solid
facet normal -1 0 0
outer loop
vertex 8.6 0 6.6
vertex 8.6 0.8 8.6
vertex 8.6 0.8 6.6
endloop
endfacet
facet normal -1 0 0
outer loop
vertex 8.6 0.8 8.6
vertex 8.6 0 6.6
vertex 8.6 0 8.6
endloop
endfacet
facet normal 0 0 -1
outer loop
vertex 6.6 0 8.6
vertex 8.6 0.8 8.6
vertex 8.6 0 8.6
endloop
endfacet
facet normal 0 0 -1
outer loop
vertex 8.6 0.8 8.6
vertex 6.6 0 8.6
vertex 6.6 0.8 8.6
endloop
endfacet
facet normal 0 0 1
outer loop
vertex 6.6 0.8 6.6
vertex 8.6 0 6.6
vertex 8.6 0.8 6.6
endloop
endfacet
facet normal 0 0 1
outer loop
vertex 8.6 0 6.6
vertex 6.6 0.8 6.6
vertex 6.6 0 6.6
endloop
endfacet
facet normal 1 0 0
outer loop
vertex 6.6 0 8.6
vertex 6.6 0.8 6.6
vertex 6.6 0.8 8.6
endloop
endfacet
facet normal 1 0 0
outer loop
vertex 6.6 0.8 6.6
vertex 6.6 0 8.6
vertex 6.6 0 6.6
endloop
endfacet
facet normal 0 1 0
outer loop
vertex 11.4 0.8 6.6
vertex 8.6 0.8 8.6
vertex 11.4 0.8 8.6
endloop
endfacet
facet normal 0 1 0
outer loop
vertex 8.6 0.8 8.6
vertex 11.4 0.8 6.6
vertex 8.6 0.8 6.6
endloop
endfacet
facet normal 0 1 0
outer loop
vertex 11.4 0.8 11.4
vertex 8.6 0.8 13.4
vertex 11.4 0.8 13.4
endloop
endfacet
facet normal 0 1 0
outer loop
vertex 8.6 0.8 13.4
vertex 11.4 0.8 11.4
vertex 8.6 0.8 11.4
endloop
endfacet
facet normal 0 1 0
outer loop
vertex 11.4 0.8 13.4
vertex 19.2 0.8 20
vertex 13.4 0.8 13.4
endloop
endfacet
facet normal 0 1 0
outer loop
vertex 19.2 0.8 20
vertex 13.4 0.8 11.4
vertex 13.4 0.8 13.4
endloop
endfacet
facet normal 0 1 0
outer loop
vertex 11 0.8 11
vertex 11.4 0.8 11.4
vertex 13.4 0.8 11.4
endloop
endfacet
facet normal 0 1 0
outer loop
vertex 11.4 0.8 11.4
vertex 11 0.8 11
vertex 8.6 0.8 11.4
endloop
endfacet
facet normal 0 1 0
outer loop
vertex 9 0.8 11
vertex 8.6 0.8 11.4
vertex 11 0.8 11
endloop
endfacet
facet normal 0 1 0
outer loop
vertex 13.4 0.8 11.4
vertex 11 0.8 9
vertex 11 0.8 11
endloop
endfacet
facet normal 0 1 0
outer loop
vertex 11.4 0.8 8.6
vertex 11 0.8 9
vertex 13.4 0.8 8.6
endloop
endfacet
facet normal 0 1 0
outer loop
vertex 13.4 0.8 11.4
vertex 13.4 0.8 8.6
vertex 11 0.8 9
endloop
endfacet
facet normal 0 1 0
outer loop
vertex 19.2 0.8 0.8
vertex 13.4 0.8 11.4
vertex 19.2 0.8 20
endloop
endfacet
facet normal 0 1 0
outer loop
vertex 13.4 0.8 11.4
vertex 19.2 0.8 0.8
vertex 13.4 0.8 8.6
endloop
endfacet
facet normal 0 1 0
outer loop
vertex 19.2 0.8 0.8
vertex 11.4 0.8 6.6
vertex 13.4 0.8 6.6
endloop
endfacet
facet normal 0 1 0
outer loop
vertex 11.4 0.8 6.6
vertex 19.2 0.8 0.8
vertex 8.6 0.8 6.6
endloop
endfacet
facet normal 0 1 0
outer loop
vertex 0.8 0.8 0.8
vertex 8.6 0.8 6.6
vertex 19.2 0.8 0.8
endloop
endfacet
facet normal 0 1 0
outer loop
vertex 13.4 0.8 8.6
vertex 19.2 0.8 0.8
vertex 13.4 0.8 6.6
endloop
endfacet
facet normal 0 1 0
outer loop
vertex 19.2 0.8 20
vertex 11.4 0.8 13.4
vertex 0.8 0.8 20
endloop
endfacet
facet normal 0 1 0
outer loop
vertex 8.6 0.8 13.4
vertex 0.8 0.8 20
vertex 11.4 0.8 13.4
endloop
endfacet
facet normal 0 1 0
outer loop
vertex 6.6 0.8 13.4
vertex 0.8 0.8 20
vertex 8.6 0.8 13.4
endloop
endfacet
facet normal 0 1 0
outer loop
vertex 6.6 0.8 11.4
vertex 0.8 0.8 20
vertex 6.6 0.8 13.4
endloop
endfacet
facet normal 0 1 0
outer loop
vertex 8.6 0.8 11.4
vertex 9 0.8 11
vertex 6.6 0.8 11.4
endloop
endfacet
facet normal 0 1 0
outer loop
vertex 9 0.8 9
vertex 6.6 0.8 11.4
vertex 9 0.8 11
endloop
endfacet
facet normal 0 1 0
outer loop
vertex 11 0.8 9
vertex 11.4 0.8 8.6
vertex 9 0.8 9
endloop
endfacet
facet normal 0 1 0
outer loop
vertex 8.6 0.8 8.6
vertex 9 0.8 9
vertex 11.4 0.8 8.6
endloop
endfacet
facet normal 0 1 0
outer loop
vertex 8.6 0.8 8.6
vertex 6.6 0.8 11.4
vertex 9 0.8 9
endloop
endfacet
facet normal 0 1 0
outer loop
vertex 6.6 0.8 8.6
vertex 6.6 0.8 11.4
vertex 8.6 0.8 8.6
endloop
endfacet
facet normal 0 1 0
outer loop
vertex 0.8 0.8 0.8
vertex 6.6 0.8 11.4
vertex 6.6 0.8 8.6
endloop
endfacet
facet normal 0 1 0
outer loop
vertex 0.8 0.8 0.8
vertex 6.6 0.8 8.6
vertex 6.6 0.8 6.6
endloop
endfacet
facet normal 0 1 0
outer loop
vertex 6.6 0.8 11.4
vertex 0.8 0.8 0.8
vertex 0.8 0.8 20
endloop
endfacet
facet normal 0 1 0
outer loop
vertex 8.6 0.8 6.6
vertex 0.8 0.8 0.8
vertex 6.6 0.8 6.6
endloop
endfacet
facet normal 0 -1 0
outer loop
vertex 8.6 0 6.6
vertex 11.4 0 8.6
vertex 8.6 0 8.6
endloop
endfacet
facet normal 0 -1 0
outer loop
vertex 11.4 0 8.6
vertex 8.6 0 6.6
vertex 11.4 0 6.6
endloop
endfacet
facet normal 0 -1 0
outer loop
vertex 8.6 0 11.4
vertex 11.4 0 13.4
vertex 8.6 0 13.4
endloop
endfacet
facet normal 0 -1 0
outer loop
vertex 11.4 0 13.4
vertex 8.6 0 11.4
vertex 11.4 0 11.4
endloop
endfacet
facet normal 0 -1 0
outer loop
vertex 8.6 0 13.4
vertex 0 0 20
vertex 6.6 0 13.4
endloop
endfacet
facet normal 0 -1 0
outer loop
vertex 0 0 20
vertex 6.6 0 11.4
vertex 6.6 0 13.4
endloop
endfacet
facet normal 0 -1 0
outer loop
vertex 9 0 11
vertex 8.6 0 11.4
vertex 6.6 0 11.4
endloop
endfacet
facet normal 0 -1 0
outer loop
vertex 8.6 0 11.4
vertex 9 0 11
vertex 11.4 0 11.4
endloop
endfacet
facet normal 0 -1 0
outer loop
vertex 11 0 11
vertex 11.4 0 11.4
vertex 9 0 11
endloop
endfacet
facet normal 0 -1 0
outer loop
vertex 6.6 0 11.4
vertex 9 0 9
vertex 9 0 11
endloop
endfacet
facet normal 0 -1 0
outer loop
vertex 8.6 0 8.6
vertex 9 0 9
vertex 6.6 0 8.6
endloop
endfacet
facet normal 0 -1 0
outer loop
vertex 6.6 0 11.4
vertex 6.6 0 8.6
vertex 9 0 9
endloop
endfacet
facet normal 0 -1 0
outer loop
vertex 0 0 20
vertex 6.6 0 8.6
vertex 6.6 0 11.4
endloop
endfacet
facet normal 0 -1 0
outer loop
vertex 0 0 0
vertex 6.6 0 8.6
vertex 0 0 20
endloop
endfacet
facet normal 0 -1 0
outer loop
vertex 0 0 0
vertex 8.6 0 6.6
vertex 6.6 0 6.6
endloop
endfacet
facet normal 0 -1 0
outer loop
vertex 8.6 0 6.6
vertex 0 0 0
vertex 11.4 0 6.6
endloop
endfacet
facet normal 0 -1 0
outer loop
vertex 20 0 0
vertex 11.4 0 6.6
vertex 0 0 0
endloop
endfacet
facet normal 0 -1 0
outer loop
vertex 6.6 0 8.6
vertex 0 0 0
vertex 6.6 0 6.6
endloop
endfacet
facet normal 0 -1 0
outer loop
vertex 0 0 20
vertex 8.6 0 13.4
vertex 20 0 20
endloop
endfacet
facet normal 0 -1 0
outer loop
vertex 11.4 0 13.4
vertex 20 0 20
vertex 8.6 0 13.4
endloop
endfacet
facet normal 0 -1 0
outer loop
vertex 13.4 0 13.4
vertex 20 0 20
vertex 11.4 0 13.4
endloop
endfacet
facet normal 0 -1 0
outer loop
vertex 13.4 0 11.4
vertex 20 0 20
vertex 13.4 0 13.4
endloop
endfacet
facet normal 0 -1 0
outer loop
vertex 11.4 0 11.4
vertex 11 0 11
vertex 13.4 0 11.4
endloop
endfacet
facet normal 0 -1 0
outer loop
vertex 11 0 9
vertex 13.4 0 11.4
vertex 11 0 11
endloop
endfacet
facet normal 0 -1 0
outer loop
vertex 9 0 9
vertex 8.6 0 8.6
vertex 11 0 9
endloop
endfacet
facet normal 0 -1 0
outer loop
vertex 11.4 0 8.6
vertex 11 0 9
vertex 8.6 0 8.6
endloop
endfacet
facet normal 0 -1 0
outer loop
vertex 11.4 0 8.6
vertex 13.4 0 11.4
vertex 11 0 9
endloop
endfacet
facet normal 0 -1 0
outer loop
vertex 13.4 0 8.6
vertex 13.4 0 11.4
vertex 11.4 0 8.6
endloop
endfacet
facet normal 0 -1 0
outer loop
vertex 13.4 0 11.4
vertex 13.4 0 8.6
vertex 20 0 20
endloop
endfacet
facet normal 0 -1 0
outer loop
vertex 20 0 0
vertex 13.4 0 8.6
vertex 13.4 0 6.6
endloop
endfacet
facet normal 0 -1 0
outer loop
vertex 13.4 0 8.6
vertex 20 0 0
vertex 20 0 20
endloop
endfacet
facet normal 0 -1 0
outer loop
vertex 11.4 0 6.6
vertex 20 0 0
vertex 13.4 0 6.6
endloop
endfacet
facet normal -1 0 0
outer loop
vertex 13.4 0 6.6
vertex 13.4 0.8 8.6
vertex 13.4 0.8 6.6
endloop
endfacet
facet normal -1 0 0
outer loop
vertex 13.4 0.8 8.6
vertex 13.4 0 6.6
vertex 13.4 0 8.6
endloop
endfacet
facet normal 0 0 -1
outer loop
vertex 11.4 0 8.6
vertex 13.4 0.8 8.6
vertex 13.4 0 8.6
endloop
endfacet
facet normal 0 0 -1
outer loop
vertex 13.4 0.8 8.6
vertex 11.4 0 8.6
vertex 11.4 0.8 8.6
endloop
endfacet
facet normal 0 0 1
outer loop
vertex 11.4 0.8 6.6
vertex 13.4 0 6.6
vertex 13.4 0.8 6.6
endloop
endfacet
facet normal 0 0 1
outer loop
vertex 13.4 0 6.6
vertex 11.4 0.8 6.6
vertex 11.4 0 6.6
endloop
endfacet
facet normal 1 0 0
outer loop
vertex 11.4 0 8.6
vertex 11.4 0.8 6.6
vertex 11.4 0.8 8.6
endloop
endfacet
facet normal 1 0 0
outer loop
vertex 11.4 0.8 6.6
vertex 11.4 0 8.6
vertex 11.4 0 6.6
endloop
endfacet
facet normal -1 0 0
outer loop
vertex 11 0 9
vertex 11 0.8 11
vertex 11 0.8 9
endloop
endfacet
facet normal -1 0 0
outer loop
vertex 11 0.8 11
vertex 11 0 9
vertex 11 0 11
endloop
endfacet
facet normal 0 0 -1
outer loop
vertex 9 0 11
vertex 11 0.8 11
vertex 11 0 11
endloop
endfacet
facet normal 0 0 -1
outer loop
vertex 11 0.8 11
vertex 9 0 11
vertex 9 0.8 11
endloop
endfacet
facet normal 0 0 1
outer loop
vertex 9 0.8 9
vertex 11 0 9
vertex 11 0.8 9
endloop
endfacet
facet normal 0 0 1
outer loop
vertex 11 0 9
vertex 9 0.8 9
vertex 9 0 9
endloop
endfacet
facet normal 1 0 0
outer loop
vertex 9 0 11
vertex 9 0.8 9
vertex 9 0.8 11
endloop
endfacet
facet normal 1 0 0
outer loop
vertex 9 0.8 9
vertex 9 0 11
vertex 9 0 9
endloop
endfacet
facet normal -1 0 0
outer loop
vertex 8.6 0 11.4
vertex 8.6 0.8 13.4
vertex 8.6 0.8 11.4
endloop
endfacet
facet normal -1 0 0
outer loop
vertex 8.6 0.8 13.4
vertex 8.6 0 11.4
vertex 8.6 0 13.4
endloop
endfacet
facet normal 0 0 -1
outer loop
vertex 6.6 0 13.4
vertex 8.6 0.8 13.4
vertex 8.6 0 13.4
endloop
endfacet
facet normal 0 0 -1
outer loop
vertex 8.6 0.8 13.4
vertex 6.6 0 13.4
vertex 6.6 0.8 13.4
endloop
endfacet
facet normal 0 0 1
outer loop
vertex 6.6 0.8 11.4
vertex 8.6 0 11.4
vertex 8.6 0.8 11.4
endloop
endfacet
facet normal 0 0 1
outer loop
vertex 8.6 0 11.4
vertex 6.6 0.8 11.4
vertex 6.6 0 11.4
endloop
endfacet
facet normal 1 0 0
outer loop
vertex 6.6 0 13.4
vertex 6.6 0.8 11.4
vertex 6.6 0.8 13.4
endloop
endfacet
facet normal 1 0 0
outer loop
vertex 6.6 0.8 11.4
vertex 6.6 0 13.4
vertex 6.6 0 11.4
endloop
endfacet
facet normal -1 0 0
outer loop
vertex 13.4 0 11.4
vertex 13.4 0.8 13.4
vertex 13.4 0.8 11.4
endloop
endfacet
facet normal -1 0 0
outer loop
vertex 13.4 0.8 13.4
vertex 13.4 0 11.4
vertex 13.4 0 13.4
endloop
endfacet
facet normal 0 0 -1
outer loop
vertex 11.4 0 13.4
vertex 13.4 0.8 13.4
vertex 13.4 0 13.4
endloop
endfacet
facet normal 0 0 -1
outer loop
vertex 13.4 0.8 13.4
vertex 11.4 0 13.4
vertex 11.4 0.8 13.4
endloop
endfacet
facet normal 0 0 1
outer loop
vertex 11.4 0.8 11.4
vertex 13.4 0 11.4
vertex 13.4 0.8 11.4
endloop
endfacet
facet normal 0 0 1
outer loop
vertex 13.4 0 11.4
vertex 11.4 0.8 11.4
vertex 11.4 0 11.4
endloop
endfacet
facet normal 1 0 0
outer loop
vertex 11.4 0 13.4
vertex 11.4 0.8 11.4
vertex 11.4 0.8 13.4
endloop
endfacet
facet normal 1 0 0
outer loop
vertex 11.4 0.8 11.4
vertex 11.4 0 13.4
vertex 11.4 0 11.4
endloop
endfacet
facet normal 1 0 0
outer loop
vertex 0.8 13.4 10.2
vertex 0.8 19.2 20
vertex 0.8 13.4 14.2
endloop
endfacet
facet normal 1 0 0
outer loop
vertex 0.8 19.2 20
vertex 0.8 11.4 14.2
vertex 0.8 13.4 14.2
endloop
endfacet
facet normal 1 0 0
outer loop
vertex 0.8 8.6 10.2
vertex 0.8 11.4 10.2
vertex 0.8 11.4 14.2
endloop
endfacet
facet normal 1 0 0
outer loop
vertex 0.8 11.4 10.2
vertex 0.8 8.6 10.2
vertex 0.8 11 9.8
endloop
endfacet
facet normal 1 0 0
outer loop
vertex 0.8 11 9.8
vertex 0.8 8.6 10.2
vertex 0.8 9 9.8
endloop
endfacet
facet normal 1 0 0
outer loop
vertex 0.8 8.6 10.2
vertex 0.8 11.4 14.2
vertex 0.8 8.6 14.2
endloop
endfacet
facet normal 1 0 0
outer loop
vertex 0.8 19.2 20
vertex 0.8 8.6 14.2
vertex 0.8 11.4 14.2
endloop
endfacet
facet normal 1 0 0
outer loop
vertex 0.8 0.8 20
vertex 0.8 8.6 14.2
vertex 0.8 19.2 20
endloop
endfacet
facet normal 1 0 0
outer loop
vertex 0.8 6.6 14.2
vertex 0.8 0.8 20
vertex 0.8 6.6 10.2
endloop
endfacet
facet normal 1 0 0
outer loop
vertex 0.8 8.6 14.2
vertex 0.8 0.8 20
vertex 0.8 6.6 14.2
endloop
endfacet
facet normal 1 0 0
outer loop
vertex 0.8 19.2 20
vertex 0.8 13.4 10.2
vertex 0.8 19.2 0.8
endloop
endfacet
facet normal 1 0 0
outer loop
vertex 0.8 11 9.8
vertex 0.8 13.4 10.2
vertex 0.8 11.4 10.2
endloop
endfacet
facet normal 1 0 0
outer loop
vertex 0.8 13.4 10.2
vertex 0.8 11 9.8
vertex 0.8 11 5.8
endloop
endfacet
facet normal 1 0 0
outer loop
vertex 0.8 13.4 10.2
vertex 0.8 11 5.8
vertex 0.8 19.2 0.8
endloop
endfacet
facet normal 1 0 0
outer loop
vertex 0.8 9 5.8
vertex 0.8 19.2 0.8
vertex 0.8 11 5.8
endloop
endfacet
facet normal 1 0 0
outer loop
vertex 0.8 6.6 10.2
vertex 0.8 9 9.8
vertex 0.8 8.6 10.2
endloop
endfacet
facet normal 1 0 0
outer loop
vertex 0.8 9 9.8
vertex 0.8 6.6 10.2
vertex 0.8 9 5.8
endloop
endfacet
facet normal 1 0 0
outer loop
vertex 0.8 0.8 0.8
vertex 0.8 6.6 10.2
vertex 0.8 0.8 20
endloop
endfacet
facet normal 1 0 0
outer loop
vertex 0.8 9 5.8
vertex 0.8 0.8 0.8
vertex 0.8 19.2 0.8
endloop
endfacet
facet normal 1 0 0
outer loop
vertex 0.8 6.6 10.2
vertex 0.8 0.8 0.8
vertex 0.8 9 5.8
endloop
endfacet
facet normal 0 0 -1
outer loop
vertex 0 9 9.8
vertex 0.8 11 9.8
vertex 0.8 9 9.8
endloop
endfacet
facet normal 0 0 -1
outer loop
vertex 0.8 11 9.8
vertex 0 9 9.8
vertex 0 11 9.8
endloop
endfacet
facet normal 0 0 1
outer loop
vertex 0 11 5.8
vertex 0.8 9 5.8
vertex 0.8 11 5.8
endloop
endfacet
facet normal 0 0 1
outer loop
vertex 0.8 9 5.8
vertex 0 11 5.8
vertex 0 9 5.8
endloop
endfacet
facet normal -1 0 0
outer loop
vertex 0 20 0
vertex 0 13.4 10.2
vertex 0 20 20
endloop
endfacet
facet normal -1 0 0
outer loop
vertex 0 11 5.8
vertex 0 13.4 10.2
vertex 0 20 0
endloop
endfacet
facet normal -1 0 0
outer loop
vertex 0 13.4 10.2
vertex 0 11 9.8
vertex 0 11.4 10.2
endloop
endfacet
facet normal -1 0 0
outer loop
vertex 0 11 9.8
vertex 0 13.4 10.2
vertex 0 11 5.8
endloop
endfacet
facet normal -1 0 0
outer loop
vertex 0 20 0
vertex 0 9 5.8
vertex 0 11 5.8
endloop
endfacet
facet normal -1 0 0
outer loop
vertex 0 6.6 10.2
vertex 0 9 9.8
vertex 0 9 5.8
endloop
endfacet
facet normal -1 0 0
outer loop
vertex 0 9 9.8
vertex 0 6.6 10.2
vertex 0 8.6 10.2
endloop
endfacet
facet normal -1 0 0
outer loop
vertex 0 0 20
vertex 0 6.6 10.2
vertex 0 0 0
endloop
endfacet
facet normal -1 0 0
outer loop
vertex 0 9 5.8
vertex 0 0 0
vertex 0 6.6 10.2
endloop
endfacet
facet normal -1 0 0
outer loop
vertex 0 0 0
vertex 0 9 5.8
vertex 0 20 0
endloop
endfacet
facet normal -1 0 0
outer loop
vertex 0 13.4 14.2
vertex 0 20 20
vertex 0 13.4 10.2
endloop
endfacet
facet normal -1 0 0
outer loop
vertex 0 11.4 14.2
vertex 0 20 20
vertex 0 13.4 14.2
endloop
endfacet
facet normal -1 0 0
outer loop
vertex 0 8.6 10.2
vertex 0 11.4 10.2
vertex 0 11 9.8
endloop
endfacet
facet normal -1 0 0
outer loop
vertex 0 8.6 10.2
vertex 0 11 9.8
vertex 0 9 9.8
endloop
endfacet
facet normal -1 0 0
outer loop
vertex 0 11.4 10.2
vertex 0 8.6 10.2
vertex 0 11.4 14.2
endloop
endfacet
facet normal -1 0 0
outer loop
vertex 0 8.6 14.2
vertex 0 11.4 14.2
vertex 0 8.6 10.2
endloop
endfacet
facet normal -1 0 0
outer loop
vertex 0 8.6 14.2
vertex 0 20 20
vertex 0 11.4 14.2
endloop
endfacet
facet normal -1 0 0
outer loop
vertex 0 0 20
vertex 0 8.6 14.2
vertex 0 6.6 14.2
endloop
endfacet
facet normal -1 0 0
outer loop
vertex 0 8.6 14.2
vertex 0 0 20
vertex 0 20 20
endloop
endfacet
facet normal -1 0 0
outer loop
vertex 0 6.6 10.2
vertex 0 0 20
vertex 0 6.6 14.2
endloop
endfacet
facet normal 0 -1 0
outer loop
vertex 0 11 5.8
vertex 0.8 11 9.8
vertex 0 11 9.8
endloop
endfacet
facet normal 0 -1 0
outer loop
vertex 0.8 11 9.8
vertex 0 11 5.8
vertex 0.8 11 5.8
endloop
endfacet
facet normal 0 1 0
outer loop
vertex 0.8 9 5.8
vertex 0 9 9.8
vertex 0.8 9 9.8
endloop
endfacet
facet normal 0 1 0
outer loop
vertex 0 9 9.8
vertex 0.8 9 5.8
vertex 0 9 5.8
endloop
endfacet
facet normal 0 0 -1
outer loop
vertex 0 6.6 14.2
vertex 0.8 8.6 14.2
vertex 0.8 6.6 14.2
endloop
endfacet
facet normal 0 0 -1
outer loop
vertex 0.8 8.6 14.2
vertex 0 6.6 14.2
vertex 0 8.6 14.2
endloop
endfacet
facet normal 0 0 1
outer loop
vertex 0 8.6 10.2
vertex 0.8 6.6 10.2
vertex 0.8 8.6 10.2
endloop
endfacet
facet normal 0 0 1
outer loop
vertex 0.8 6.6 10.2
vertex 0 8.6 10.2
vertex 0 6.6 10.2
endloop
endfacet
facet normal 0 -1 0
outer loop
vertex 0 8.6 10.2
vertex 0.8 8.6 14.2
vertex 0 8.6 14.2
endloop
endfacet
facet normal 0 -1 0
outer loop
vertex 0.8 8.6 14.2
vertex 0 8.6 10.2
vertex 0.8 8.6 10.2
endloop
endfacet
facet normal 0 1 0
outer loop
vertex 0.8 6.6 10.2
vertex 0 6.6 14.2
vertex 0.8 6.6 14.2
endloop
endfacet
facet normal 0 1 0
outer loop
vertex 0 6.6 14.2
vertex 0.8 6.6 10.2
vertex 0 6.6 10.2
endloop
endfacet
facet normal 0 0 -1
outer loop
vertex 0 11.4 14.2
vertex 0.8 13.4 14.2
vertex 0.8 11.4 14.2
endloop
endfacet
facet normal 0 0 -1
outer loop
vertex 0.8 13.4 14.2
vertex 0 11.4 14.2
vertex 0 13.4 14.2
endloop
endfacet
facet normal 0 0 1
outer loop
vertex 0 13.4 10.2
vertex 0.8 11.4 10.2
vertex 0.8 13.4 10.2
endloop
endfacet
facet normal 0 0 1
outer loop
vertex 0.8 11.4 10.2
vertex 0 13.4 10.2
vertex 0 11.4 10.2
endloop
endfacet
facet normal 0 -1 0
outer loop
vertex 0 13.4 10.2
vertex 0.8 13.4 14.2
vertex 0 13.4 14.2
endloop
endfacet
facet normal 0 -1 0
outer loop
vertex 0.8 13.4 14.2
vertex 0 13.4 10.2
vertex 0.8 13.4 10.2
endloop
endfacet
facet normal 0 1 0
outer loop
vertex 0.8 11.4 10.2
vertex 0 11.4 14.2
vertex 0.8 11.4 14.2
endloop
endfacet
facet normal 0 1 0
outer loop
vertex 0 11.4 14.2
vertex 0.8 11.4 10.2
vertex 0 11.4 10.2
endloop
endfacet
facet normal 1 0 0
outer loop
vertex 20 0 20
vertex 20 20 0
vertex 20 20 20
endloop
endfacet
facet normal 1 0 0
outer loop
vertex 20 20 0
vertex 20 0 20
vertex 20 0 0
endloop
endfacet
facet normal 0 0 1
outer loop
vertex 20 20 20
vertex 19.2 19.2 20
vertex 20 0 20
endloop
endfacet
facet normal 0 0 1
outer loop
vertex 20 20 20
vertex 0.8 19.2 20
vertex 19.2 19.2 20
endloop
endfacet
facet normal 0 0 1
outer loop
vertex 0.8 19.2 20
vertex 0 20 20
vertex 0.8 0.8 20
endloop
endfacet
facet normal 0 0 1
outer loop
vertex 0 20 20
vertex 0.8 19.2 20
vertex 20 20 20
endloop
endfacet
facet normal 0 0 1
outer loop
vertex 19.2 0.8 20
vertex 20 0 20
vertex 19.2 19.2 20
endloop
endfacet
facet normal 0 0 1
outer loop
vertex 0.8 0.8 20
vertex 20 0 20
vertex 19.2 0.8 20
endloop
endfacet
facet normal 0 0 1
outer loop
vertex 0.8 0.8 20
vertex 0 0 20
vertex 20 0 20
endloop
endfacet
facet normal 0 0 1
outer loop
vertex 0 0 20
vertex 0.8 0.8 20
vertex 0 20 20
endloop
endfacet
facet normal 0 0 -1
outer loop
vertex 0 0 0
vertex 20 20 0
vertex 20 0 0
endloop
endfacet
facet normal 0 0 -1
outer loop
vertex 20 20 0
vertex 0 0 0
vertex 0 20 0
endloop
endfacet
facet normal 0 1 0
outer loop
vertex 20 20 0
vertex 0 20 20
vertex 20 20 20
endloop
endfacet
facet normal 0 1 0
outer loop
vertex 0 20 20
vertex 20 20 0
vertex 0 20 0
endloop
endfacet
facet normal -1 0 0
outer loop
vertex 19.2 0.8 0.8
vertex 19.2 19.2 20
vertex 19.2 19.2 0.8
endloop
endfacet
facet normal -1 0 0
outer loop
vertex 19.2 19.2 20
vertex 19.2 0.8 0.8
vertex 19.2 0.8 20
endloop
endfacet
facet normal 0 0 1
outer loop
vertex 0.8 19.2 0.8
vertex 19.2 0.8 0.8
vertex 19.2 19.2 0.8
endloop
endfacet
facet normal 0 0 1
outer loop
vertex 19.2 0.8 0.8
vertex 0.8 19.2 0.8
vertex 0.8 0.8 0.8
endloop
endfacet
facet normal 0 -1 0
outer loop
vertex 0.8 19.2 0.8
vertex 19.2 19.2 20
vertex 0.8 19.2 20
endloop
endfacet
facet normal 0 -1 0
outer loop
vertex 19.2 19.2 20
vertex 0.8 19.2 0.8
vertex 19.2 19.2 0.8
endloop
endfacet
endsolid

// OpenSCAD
cube_dims = 20;
thk = 0.8;
inner_cube_dims = cube_dims - thk*2;

marker_x_h = 6.6;
marker_x_l = 6.6;
marker_y_h = 10-4.2;
marker_y_l = 10-1;
marker_spacing = 0.4;

marker_square_dim = 2;
marker_square_length = thk;

difference()
{
cube([cube_dims,cube_dims,cube_dims]);
translate([thk,thk,thk])
    cube([inner_cube_dims,inner_cube_dims,cube_dims]);
    
    // x marker
    translate([marker_x_l,0,marker_x_h])
    {
        cube([marker_square_dim,marker_square_length,marker_square_dim]);
        translate([(2*marker_square_dim+2*marker_spacing),0,0])
            cube([marker_square_dim,marker_square_length,marker_square_dim]);
        
        translate([(marker_square_dim+marker_spacing),0,(marker_square_dim+marker_spacing)])
            cube([marker_square_dim,marker_square_length,marker_square_dim]);
        
        translate([0,0,(2*marker_square_dim+2*marker_spacing)])
            cube([marker_square_dim,marker_square_length,marker_square_dim]);
        translate([(2*marker_square_dim+2*marker_spacing),0,(2*marker_square_dim+2*marker_spacing)])
            cube([marker_square_dim,marker_square_length,marker_square_dim]);  
    }
    
    // y marker
    translate([0,marker_y_l,marker_y_h])
    {
        cube([marker_square_length,marker_square_dim,marker_square_dim*2]);
        
        translate([0,-(marker_square_dim+marker_spacing),marker_square_dim*2+marker_spacing])
            cube([marker_square_length,marker_square_dim,2*marker_square_dim]);
        
        translate([0,(marker_square_dim+marker_spacing),marker_square_dim*2+marker_spacing])
            cube([marker_square_length,marker_square_dim,2*marker_square_dim]);
        
    }
}


// y marker
